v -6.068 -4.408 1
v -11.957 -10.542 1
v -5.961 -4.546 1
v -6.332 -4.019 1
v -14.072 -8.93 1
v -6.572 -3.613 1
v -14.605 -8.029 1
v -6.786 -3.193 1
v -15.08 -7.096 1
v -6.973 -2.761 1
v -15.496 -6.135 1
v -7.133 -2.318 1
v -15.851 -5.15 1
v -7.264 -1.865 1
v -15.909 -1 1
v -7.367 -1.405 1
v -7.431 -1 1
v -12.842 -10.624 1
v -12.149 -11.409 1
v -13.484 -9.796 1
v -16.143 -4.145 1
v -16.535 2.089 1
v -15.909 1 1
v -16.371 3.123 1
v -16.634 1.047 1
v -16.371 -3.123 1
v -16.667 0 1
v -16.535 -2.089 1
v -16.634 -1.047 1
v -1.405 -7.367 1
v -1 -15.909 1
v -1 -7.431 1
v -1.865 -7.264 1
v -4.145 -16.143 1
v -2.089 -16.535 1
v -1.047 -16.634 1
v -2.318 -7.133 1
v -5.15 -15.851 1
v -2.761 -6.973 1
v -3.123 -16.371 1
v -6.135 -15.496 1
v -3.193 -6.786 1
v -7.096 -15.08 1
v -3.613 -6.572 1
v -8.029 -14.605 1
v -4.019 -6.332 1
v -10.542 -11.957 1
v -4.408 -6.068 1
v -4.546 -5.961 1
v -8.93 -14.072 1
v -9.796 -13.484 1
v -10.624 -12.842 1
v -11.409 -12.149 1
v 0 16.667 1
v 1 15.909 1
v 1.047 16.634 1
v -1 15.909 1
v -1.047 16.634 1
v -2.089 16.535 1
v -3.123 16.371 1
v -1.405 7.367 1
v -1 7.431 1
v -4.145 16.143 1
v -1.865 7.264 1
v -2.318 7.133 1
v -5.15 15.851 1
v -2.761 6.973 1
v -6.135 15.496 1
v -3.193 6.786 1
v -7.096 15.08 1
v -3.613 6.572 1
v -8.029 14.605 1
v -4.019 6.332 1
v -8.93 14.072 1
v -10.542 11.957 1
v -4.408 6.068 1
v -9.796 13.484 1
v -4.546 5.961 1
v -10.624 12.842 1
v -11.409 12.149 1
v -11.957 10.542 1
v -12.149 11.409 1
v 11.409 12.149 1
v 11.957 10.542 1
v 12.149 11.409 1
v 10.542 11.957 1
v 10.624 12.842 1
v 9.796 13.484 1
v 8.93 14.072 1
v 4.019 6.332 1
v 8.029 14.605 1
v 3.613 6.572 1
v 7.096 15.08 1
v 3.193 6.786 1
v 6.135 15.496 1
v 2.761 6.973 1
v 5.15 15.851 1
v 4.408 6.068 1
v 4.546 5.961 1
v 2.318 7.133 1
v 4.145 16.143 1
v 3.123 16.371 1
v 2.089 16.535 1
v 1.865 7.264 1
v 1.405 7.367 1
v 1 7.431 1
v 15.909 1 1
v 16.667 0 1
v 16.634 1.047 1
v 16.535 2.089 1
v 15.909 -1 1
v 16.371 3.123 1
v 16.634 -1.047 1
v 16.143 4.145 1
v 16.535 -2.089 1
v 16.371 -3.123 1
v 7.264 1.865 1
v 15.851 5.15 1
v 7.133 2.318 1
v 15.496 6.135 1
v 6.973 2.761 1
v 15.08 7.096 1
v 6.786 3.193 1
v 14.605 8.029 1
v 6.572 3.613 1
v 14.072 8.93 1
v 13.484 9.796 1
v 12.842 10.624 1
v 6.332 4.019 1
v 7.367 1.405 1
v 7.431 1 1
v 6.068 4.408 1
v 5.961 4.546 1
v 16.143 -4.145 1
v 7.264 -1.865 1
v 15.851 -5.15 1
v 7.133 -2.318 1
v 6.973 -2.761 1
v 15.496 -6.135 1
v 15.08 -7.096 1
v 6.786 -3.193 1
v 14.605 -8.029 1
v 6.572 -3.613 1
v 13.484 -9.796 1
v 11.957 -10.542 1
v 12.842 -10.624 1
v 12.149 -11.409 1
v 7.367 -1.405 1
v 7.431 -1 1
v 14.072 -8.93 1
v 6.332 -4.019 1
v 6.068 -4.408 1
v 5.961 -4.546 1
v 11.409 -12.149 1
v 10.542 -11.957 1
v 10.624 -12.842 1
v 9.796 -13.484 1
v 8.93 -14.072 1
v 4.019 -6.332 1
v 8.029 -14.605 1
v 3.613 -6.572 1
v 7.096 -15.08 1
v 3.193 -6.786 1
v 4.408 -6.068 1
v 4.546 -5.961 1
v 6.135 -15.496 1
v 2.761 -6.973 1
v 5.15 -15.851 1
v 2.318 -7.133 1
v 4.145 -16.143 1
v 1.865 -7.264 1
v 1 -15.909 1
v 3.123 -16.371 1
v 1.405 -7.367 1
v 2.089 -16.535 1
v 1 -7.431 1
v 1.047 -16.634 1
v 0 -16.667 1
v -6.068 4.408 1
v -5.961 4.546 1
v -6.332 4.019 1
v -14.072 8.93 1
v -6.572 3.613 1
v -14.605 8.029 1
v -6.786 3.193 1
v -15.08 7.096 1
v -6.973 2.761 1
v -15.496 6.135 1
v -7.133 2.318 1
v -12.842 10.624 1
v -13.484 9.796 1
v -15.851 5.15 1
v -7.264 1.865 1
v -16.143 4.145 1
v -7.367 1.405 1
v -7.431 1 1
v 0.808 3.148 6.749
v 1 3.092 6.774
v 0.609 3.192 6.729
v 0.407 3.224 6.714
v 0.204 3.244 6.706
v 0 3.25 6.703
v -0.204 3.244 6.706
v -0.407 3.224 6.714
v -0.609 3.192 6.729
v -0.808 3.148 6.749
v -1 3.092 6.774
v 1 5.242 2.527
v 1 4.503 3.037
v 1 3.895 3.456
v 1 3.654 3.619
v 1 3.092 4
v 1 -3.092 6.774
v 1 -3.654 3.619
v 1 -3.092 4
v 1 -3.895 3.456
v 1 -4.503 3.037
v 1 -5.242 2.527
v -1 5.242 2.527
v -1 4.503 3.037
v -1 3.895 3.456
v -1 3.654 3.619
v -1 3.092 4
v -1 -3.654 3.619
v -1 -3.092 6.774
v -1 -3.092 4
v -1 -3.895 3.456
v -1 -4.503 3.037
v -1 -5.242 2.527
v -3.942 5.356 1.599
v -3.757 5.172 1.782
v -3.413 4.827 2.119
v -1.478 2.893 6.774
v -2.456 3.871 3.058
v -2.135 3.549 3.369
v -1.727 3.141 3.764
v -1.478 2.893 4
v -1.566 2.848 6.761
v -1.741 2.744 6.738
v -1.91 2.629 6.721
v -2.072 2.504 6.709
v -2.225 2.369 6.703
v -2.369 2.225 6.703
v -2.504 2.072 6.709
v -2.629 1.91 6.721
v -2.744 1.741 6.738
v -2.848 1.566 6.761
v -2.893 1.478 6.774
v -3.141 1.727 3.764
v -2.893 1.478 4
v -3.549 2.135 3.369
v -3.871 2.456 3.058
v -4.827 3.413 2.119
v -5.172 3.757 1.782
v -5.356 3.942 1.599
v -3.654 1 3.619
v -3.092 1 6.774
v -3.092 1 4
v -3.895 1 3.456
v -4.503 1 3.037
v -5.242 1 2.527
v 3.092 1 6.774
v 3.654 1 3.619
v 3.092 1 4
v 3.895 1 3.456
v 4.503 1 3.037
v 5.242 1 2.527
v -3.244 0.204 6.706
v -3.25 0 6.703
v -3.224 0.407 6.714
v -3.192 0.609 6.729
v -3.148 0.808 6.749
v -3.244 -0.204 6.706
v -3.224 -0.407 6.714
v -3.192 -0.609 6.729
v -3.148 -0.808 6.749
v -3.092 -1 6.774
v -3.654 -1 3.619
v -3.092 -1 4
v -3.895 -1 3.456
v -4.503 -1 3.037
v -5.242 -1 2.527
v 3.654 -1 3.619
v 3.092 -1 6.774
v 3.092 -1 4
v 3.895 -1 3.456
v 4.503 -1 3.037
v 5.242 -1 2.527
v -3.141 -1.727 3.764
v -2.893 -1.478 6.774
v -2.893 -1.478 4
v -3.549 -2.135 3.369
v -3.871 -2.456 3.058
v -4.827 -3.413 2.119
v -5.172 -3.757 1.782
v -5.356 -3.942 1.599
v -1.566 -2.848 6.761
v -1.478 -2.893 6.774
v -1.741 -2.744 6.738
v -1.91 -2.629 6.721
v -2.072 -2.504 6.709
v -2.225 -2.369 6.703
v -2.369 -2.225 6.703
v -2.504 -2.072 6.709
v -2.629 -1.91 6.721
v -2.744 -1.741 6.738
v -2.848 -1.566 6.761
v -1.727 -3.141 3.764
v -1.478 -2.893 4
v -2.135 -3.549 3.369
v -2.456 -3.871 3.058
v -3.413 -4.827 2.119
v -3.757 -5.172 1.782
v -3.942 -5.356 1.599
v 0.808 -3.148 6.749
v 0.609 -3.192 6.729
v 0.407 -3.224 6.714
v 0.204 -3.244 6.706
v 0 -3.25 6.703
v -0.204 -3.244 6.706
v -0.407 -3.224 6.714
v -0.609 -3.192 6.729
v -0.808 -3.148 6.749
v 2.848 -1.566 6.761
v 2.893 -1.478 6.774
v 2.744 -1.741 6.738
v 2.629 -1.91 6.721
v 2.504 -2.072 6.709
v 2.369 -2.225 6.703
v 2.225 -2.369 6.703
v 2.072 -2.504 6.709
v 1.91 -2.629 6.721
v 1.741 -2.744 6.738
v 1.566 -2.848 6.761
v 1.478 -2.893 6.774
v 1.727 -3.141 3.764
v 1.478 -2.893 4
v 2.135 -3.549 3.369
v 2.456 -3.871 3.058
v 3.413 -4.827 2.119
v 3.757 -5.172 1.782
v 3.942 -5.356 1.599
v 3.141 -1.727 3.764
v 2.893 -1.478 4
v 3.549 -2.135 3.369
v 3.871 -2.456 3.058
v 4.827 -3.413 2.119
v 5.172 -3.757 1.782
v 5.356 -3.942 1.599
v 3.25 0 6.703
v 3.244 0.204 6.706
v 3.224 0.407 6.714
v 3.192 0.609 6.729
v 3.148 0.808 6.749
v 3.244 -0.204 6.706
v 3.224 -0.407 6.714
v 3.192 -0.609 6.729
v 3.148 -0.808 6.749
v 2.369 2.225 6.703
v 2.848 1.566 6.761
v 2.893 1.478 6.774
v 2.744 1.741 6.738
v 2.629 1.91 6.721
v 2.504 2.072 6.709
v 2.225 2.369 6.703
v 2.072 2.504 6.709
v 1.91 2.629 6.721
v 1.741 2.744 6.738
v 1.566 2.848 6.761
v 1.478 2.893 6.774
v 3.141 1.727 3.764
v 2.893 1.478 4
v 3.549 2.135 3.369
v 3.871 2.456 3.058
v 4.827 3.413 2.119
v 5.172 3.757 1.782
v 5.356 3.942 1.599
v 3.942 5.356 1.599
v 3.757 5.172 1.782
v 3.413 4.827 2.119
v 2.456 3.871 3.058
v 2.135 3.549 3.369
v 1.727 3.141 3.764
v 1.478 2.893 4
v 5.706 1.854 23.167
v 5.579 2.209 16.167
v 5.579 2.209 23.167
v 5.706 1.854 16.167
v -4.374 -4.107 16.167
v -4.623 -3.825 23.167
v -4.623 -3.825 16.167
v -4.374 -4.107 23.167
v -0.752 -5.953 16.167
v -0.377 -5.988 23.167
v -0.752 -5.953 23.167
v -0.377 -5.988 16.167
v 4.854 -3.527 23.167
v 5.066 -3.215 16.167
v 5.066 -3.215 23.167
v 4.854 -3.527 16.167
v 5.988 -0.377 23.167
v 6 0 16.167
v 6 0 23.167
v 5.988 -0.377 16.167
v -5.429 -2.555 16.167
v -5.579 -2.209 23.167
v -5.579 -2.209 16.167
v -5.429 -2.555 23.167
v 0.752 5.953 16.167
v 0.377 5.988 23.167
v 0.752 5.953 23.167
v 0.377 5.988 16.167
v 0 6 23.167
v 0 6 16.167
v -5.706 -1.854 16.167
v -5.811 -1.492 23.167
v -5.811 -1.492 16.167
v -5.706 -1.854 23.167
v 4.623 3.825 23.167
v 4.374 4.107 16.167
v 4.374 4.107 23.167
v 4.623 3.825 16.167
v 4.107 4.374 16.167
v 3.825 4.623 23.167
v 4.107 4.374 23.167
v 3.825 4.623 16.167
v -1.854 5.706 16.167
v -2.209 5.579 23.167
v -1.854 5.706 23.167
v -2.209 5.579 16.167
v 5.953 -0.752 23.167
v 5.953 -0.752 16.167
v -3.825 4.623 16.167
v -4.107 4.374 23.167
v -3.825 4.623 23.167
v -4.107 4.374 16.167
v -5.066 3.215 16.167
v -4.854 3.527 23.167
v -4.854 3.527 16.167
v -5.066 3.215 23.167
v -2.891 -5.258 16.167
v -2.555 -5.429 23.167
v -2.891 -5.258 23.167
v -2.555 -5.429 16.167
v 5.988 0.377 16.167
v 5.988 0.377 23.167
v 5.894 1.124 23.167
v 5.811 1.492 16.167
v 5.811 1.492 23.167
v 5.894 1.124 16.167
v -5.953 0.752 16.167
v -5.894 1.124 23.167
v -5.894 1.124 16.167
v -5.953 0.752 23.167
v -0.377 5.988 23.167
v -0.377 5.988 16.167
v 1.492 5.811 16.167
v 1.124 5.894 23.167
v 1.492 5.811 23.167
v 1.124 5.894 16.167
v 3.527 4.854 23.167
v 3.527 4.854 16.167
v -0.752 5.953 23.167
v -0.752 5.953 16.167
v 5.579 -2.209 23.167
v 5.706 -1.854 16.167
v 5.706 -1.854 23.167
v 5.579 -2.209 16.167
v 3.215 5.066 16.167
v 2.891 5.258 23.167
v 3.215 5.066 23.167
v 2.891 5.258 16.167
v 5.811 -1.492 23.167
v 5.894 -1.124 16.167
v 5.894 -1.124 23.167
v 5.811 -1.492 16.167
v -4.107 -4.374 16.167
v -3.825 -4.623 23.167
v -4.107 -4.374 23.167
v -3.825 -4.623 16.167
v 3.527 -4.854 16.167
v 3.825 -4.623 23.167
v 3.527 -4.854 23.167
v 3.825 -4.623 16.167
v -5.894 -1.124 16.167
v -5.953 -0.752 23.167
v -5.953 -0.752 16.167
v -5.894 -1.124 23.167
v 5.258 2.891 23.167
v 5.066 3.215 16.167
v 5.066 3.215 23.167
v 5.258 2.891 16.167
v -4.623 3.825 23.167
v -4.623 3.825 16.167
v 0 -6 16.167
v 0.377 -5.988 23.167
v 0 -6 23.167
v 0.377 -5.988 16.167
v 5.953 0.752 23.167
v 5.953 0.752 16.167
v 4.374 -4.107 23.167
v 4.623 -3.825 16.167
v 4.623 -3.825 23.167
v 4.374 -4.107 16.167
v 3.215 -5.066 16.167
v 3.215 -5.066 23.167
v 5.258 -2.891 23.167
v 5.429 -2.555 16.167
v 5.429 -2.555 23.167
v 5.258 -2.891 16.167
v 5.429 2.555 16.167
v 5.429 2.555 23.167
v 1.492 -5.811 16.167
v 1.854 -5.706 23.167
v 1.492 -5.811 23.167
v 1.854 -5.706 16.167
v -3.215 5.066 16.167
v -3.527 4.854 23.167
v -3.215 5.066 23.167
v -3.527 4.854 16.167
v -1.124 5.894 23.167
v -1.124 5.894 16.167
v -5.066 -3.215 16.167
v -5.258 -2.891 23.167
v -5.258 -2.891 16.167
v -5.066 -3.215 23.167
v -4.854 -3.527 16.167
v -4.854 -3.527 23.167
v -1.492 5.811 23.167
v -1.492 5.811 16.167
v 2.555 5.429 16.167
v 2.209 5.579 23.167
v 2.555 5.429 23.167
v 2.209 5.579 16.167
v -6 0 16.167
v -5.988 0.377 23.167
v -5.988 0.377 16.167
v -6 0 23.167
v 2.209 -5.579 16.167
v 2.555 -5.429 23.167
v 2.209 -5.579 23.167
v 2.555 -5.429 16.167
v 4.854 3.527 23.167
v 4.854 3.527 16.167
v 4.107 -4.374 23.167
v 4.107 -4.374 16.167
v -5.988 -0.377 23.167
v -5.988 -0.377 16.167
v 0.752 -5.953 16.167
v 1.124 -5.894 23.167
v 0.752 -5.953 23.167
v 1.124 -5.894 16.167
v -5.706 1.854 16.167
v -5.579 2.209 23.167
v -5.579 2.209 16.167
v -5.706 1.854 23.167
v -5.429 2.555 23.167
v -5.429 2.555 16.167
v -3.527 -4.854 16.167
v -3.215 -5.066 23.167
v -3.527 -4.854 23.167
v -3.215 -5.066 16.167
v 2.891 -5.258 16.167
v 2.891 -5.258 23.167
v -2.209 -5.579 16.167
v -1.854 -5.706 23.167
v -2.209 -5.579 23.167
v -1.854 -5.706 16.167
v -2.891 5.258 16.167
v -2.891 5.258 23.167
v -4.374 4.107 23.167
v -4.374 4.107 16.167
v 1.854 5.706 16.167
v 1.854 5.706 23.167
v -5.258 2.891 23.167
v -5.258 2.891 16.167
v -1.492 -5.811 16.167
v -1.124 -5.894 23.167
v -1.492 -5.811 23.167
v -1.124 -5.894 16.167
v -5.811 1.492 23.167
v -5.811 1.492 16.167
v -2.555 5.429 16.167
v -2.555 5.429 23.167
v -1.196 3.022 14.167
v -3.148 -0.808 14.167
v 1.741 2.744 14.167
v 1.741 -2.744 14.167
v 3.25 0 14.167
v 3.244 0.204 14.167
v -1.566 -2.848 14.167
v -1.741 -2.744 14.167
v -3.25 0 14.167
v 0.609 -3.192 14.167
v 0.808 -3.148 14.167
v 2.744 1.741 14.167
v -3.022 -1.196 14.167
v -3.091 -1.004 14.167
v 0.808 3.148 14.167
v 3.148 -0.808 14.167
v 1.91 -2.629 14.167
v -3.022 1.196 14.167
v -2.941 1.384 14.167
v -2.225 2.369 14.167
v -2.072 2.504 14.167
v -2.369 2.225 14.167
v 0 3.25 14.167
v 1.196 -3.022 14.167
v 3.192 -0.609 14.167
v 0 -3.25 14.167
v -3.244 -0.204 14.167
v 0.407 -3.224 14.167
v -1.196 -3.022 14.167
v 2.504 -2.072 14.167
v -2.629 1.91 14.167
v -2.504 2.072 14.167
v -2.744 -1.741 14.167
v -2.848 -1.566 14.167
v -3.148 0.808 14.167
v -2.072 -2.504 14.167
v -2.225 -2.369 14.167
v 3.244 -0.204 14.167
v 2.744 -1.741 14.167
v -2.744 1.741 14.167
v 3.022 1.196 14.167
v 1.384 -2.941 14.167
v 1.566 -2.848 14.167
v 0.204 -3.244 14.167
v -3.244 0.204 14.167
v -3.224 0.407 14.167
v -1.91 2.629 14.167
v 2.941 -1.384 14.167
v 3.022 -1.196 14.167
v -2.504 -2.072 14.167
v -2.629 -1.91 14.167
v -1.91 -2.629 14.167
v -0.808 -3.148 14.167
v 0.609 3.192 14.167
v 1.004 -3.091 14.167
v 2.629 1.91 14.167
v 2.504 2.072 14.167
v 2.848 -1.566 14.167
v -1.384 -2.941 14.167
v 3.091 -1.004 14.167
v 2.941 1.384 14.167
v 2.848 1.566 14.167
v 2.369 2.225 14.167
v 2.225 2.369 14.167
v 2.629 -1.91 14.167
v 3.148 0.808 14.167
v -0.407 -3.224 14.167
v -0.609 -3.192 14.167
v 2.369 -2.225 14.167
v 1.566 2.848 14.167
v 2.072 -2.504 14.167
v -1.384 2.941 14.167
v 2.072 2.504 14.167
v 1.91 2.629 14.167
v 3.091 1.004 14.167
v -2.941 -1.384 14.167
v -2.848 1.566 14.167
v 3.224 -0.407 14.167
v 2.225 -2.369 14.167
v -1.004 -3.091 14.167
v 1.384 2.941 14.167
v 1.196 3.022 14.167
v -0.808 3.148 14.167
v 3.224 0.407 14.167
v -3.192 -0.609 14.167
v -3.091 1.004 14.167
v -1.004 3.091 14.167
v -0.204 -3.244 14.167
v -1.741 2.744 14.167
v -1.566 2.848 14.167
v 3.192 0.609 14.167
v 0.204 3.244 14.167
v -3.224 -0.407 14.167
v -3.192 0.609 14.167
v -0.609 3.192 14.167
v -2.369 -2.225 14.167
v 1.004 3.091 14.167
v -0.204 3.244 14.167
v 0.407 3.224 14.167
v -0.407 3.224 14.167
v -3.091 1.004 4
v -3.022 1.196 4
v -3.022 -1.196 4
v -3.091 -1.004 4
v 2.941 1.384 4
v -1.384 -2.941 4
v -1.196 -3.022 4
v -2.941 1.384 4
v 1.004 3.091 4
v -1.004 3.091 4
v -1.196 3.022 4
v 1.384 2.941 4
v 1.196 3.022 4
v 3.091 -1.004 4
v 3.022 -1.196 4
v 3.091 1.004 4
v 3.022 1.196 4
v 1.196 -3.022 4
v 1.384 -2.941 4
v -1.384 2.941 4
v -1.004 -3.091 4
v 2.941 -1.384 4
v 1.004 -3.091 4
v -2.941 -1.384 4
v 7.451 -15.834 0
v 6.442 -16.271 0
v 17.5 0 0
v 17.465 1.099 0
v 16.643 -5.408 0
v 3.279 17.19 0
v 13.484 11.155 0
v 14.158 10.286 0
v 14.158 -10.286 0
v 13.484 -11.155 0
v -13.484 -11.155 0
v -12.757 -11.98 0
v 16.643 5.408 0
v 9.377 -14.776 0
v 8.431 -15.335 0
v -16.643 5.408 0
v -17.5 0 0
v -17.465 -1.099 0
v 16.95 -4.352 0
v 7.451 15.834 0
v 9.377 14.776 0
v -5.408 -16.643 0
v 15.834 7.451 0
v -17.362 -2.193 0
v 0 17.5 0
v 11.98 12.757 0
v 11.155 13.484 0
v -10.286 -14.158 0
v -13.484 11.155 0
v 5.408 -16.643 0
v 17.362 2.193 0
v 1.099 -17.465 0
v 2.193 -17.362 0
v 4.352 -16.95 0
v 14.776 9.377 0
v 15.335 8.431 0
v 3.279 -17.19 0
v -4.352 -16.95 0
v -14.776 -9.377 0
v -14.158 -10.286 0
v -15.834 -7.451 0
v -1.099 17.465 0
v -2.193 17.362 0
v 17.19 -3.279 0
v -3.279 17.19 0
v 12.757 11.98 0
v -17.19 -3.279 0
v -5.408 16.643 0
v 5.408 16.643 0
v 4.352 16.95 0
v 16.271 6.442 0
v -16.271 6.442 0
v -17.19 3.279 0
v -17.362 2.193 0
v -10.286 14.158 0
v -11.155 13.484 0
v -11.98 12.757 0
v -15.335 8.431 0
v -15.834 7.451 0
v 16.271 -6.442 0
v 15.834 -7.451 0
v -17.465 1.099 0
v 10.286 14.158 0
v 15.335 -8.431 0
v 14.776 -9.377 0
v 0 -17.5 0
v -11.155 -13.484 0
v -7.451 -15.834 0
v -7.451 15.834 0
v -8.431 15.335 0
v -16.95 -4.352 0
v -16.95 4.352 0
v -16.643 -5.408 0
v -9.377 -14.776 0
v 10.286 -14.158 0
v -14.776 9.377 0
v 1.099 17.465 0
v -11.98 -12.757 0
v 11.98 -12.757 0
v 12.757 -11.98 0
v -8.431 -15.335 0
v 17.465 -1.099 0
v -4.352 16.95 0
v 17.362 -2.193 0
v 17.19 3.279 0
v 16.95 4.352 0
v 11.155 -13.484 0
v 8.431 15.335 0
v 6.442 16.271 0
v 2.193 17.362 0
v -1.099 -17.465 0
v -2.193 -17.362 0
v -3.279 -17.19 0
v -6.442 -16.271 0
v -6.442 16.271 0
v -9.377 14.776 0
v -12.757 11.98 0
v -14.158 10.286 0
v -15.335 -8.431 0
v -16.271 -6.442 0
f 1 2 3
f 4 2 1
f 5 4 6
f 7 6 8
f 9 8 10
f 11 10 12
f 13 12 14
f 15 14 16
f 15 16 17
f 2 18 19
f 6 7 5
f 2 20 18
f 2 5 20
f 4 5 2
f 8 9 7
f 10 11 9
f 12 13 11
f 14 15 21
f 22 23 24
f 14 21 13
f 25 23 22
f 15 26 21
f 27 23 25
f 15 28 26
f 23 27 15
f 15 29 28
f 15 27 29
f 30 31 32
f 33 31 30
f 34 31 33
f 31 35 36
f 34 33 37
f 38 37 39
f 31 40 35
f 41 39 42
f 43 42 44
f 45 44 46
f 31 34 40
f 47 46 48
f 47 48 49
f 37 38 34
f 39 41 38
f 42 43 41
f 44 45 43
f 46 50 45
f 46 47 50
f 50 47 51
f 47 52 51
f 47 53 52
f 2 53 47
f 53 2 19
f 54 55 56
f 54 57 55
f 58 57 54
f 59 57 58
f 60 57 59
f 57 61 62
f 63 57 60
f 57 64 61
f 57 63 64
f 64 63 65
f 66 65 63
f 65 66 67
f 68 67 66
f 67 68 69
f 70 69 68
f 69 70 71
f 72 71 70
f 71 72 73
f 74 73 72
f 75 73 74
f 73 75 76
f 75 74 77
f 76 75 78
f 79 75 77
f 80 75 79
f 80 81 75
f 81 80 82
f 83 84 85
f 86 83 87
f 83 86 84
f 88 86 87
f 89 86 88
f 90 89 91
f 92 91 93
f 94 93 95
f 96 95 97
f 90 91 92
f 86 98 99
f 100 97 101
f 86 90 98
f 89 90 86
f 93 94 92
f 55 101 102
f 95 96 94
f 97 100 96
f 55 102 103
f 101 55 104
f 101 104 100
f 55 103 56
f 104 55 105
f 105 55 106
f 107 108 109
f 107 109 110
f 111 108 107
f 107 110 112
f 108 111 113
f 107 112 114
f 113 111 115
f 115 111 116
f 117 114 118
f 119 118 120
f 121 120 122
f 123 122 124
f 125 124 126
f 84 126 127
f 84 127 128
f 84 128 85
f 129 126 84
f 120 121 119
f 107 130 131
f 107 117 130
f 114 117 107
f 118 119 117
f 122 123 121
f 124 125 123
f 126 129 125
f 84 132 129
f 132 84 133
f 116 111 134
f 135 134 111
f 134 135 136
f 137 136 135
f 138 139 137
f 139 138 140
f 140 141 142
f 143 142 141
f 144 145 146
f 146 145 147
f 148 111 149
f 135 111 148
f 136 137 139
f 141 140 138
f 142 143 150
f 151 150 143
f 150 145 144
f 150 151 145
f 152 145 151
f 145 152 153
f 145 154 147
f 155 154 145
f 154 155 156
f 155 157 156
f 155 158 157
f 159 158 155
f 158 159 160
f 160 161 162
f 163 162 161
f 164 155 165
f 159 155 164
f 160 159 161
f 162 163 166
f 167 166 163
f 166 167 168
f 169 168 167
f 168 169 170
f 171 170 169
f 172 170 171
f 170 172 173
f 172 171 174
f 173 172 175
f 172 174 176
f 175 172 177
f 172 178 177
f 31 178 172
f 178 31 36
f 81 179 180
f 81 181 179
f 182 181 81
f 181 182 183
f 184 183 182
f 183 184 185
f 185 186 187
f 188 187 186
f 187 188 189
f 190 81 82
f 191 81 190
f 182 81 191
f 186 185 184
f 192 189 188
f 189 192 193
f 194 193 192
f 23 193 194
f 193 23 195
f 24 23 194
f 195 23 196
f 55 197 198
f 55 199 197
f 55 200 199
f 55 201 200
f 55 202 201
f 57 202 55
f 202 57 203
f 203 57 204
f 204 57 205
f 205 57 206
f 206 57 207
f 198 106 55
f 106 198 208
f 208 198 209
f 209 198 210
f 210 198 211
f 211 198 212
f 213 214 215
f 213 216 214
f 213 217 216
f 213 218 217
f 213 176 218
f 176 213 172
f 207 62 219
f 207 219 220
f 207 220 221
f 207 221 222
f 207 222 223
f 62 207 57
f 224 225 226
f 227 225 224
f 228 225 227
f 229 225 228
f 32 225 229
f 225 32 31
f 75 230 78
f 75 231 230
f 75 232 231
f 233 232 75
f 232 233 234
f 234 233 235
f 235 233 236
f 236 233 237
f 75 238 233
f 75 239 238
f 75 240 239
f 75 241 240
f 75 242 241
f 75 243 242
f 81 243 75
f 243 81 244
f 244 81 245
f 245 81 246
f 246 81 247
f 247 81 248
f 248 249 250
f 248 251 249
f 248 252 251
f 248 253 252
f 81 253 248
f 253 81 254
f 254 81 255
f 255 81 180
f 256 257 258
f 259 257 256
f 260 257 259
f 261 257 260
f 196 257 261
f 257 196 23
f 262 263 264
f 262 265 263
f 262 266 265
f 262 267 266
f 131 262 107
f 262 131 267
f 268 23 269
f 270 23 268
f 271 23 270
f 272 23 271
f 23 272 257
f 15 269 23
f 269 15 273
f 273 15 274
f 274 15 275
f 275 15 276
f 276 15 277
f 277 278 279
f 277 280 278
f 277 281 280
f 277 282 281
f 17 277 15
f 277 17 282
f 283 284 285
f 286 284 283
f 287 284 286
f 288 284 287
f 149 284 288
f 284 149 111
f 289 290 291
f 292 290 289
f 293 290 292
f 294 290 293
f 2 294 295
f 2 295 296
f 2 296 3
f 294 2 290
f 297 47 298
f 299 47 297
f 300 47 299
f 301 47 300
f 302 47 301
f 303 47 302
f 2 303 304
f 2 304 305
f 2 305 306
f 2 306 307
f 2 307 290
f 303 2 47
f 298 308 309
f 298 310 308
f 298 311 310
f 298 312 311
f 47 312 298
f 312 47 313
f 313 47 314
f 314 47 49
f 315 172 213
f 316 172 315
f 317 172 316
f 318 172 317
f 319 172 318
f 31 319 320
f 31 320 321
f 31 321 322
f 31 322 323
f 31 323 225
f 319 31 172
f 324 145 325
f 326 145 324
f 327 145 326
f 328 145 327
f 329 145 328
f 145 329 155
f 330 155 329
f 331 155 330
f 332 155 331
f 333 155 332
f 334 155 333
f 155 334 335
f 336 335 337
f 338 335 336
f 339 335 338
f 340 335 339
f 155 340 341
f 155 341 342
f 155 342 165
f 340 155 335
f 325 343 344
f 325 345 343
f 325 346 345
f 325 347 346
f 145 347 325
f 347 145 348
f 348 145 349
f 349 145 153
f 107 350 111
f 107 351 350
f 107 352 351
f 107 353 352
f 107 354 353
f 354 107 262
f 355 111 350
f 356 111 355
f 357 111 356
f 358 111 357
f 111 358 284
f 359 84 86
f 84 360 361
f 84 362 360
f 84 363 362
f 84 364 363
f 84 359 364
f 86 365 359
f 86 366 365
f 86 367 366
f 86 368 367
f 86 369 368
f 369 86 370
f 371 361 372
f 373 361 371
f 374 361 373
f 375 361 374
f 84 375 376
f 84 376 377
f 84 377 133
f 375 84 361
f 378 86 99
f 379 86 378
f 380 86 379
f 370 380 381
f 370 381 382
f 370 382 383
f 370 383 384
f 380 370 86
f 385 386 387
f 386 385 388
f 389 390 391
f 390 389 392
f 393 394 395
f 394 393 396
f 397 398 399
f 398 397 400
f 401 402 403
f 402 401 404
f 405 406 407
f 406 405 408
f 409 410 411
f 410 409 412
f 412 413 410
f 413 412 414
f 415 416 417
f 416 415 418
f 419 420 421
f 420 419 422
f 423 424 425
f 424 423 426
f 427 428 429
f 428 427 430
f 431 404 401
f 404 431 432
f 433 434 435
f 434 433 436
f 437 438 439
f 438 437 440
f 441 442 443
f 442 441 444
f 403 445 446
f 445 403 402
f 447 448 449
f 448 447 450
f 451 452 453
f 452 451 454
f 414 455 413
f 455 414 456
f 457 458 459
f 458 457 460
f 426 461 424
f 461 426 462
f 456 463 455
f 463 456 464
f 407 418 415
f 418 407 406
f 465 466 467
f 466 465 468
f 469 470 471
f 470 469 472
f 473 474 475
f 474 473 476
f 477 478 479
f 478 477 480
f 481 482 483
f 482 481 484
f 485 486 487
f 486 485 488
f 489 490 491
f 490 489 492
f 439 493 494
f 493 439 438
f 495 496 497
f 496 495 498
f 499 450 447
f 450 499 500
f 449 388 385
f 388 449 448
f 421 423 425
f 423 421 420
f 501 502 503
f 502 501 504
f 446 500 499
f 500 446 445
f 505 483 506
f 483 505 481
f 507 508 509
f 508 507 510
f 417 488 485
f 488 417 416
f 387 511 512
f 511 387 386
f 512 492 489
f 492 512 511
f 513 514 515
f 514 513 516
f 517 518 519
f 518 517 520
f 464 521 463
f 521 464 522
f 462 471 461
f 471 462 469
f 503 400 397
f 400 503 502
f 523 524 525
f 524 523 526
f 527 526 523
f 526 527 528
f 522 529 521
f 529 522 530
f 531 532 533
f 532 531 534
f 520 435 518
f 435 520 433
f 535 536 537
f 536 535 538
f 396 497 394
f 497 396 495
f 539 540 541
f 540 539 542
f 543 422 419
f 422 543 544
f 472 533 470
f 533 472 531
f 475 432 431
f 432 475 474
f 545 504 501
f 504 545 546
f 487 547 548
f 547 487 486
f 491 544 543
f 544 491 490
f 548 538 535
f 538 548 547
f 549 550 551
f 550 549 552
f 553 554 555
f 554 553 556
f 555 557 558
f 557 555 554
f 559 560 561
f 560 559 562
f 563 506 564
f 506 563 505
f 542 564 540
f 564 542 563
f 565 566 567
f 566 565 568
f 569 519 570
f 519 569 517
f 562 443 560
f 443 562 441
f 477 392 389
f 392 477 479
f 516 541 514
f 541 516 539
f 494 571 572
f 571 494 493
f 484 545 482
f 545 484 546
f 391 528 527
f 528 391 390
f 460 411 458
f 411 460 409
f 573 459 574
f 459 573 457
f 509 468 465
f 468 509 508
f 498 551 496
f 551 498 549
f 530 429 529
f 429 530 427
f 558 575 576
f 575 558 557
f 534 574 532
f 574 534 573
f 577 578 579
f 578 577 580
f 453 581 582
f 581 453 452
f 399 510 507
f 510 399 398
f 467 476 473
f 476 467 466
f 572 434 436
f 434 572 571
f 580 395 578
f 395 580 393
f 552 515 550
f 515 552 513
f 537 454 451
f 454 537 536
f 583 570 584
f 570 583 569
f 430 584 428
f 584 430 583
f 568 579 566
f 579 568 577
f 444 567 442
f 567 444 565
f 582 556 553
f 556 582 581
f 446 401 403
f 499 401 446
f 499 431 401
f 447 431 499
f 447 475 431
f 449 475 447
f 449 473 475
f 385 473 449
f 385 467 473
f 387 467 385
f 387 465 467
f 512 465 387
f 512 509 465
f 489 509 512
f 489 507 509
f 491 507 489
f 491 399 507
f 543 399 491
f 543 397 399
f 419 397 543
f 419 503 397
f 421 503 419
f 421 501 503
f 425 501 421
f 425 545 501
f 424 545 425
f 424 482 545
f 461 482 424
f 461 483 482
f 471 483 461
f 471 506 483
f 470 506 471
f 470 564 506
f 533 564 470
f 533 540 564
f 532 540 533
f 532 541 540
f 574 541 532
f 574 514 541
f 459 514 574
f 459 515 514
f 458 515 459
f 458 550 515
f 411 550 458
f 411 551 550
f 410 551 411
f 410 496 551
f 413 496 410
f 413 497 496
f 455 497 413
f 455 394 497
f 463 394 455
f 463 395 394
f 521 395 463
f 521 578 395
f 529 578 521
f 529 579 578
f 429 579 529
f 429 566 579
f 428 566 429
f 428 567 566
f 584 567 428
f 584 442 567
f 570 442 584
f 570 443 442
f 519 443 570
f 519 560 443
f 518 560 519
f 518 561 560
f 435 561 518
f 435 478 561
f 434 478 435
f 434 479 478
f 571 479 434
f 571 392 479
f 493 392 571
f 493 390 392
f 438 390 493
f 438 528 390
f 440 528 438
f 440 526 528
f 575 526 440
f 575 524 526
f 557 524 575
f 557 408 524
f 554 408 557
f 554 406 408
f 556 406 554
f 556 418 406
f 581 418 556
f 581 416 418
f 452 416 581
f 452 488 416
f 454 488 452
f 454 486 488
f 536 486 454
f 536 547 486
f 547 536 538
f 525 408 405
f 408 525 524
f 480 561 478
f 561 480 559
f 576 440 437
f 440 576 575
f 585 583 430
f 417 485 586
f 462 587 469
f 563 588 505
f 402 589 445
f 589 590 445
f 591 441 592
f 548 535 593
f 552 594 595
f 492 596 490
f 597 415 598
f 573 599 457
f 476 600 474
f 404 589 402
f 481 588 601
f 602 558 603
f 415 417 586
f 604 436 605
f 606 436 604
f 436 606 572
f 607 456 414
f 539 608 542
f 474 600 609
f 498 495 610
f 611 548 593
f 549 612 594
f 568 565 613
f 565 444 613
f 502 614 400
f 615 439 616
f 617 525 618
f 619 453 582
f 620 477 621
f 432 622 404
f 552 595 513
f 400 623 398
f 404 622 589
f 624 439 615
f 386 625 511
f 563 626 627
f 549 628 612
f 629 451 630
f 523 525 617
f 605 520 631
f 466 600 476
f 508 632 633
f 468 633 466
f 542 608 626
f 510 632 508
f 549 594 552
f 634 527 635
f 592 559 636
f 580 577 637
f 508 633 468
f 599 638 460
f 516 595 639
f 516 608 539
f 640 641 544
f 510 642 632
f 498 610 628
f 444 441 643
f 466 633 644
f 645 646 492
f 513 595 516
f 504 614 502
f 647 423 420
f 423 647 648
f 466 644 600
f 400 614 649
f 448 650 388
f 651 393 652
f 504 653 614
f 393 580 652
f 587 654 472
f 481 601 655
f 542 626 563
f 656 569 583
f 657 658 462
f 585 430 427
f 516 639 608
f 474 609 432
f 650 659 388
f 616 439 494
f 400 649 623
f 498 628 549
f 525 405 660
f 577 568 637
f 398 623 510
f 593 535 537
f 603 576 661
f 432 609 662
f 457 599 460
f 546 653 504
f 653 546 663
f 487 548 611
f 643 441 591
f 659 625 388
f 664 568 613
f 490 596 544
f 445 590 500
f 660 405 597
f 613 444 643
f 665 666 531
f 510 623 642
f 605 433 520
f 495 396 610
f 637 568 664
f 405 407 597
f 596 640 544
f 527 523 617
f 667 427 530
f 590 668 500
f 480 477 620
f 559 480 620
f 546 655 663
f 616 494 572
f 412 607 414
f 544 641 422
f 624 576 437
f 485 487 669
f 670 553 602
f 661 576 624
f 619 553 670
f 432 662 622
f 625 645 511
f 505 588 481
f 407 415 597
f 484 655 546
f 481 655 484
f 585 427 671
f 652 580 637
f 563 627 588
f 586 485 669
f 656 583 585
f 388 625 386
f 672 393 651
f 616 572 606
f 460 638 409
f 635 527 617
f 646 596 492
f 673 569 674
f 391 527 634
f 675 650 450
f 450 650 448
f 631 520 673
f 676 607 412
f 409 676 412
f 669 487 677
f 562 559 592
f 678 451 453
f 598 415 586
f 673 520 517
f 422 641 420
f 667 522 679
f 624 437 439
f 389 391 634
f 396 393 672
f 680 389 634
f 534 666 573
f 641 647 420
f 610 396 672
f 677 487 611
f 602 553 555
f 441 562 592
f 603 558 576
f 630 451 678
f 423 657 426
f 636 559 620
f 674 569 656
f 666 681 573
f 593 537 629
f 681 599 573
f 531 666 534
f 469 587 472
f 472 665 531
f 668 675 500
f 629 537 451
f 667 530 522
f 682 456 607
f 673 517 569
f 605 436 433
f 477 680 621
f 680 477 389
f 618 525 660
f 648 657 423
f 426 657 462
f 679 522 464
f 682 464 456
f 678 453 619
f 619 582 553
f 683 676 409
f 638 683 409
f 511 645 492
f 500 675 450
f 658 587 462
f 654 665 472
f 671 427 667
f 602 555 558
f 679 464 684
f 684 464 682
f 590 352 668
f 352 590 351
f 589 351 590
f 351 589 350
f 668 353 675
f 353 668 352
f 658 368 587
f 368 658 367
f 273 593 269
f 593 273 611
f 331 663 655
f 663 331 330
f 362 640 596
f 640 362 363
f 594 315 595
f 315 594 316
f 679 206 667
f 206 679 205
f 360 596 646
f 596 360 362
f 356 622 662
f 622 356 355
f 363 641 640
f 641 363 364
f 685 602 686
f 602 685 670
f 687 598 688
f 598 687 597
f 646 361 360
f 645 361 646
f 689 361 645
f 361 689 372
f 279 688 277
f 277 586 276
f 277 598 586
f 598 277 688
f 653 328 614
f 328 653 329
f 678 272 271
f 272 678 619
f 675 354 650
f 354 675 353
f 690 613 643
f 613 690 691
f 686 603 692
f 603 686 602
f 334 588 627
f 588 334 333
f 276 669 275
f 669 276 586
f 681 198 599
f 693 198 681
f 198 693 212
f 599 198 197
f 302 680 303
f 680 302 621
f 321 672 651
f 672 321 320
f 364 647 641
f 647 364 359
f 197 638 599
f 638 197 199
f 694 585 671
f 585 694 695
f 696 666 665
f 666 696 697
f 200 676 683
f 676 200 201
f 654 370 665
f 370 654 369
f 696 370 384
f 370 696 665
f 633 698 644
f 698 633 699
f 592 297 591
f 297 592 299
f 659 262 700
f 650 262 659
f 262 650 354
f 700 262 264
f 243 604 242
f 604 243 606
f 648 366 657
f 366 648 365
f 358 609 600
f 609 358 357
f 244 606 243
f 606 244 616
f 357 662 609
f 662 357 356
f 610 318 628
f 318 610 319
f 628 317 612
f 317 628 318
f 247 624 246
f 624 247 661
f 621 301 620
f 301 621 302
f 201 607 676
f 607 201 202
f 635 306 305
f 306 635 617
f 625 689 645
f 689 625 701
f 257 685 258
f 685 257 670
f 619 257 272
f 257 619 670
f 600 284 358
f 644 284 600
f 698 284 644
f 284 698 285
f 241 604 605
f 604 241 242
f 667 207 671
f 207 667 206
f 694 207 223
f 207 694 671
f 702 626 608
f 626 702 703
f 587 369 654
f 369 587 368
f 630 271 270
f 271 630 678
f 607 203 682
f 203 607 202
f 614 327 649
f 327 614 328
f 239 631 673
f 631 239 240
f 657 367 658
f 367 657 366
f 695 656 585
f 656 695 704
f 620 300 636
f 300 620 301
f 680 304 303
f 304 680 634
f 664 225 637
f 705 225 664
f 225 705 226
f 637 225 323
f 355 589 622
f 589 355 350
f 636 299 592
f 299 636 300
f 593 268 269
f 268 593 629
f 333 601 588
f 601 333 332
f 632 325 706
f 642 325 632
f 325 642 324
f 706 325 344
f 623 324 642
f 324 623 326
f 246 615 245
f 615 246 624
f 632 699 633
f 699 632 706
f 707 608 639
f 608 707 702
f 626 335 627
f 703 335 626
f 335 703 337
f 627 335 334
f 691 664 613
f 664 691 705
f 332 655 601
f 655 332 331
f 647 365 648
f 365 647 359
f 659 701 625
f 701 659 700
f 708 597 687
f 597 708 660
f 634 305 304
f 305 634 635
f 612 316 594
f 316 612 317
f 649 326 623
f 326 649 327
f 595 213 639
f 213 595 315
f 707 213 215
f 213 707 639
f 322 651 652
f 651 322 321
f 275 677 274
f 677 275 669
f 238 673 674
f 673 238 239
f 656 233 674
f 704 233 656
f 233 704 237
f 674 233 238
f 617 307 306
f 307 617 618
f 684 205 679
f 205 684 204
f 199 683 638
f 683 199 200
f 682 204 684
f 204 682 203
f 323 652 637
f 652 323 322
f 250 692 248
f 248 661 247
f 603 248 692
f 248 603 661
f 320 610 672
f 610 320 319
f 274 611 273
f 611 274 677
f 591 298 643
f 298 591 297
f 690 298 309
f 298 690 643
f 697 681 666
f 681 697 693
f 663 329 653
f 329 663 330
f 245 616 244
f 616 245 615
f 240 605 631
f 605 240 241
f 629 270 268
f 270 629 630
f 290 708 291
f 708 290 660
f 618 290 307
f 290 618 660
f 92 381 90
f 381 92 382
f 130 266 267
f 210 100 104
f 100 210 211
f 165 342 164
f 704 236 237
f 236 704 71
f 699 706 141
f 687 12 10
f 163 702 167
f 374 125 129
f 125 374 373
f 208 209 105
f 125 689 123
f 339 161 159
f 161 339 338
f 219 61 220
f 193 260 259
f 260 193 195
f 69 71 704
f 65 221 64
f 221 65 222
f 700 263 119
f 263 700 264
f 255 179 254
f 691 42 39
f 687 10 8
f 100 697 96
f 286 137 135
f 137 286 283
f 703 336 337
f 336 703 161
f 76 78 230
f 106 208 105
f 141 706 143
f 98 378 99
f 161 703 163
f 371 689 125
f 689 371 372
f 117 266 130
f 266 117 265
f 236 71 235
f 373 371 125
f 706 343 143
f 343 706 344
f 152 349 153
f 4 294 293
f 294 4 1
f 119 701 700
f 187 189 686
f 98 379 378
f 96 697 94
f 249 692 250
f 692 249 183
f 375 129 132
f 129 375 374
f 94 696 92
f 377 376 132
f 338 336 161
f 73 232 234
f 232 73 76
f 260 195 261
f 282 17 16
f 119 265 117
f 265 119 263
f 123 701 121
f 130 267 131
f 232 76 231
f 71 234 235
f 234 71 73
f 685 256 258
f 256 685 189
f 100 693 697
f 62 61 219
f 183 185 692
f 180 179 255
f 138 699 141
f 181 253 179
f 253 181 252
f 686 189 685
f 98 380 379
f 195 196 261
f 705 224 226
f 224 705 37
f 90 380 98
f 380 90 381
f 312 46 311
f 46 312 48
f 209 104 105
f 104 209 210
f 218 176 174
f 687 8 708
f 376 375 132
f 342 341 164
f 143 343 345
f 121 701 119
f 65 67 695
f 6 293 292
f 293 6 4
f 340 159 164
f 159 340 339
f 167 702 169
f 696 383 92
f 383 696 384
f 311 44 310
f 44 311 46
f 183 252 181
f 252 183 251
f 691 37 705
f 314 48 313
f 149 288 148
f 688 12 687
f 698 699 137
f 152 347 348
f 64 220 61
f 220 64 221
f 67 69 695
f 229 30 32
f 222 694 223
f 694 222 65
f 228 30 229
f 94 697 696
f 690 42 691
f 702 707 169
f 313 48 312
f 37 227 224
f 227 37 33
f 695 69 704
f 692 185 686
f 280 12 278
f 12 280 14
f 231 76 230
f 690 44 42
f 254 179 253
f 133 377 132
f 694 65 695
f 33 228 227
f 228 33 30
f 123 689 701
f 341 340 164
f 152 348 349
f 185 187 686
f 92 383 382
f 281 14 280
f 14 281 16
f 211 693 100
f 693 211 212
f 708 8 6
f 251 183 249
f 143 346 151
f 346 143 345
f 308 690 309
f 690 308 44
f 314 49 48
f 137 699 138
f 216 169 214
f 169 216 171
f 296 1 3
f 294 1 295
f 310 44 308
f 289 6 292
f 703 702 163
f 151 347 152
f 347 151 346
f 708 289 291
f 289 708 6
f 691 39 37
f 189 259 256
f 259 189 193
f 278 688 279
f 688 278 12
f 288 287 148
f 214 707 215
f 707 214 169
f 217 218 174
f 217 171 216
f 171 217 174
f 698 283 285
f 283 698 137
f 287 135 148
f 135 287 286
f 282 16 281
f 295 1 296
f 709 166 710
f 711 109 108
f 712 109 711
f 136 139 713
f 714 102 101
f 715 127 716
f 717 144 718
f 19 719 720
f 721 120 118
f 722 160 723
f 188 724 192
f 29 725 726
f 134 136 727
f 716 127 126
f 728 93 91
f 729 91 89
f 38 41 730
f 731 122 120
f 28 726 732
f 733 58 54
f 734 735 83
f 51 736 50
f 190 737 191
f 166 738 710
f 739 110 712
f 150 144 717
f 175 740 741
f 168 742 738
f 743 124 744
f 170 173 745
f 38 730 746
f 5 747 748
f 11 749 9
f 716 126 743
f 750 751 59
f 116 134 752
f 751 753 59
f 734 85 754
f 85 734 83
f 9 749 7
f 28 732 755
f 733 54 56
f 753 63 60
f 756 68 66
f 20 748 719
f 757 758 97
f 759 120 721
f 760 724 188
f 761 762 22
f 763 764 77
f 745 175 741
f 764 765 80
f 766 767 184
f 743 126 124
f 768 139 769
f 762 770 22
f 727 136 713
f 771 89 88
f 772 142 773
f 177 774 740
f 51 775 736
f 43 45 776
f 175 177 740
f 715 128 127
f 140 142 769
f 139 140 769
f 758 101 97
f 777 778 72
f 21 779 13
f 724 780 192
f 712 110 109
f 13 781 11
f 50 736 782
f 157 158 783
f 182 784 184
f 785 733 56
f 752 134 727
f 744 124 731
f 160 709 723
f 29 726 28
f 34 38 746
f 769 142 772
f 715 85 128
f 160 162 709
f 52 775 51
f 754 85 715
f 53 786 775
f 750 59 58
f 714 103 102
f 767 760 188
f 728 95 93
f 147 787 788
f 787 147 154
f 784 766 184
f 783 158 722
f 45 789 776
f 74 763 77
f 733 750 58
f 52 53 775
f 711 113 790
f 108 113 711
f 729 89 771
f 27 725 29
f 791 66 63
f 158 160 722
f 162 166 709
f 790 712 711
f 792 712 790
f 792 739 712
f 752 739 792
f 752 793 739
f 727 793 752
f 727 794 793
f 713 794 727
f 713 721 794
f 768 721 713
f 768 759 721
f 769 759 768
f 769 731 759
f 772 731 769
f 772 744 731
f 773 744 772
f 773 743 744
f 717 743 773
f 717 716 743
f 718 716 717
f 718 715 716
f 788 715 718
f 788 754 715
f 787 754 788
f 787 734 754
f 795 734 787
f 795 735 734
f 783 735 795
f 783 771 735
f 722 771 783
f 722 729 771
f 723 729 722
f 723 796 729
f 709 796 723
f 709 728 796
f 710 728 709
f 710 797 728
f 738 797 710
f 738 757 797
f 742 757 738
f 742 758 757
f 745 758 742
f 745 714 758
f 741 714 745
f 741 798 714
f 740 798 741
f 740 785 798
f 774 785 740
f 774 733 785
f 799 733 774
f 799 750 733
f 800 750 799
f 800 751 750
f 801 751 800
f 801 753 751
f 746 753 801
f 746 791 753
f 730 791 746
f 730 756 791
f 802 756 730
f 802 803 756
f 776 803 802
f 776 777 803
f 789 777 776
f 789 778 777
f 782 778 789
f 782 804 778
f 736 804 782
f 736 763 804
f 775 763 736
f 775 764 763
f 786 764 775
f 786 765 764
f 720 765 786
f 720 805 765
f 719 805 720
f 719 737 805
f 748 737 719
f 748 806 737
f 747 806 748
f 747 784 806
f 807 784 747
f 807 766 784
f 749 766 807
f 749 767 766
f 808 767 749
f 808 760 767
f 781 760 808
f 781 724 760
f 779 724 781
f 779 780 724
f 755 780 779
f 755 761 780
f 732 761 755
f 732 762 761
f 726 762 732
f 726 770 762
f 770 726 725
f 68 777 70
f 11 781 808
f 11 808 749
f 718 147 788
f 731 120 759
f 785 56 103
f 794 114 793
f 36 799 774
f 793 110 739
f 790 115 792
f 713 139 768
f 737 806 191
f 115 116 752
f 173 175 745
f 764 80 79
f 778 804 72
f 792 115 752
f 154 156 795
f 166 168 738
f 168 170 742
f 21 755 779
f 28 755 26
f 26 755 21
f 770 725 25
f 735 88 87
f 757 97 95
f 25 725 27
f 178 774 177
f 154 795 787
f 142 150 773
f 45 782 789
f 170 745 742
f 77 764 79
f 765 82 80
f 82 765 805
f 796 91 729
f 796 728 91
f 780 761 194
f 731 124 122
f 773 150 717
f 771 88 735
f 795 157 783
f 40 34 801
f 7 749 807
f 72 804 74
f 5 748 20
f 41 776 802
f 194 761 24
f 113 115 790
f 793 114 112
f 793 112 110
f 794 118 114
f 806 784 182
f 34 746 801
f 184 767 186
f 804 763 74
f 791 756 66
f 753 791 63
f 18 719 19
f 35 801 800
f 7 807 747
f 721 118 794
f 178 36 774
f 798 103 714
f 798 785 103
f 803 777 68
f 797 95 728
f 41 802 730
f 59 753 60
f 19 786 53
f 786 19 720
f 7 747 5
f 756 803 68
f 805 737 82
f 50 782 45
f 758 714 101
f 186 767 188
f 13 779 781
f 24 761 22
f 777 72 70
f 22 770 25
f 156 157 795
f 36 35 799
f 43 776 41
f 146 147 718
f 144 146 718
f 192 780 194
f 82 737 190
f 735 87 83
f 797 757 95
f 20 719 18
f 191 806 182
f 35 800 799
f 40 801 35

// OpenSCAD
// #Openscad Basic pdr pull plate 
// #Paintless dent repair, #Paintless dent removal #tab
// for pulling dents out of cars or hotbeds! 
// I suppose at some force point the top will brake off,
// Can also be used to check force of first layer
// adhesion on 3d printers!
// enjoy!!! 
// version= v8 2018-04
//////////

// resultion default 100 use 25 if too long
$fn=100; 

// outside diamater size in mm, defalut 35
tab(35); 

// how thick is the base, default 1
base_hight=1;
////////////////
module tab(size){
    // center_hight, is the blue center cylinder and support hight.
    center_hight=(size/3)+2.5;
    // top to bottom, press F5 to see colors in openscad
    color("lime")translate([0,0,center_hight+2])cylinder(d=12,h=7);
    // The Purple cylinder, helps print the top nob.
    color("Purple")translate([0,0,center_hight])cylinder(d1=6.5,d2=12,h=2);
    color("blue")translate([0,0,1])cylinder(d=6.5,h=center_hight+3);
    
    // only supports if above size default 20
    if (size>20){
        color("yellow")translate([0,0,1])cylinder(d1=15, d2=6.5,h=3);
    }
    // red support, default every 45 degrees.    
    if (size>30){
        for (i = [0:45:360]){
            color("red")rotate([0,0,i])
            translate([-1,0,base_hight]) prism(2,size/2.2, center_hight-7);
        }
    }
    
    // base plate
    difference(){
        color("green")cylinder(d1=size,d2=size/1.05,h=base_hight);
    }
}
/////////
// the support master shape
module prism(w,l, h){
        polyhedron(
         points=[[0,0,0], [w,0,0], [w,l,0], [0,l,0], [w,0,h],[0,0,h]],
         faces=[[0,1,2,3],[3,2,4,5],[5,4,1,0],[0,3,5],[1,4,2]]
        );
 }
